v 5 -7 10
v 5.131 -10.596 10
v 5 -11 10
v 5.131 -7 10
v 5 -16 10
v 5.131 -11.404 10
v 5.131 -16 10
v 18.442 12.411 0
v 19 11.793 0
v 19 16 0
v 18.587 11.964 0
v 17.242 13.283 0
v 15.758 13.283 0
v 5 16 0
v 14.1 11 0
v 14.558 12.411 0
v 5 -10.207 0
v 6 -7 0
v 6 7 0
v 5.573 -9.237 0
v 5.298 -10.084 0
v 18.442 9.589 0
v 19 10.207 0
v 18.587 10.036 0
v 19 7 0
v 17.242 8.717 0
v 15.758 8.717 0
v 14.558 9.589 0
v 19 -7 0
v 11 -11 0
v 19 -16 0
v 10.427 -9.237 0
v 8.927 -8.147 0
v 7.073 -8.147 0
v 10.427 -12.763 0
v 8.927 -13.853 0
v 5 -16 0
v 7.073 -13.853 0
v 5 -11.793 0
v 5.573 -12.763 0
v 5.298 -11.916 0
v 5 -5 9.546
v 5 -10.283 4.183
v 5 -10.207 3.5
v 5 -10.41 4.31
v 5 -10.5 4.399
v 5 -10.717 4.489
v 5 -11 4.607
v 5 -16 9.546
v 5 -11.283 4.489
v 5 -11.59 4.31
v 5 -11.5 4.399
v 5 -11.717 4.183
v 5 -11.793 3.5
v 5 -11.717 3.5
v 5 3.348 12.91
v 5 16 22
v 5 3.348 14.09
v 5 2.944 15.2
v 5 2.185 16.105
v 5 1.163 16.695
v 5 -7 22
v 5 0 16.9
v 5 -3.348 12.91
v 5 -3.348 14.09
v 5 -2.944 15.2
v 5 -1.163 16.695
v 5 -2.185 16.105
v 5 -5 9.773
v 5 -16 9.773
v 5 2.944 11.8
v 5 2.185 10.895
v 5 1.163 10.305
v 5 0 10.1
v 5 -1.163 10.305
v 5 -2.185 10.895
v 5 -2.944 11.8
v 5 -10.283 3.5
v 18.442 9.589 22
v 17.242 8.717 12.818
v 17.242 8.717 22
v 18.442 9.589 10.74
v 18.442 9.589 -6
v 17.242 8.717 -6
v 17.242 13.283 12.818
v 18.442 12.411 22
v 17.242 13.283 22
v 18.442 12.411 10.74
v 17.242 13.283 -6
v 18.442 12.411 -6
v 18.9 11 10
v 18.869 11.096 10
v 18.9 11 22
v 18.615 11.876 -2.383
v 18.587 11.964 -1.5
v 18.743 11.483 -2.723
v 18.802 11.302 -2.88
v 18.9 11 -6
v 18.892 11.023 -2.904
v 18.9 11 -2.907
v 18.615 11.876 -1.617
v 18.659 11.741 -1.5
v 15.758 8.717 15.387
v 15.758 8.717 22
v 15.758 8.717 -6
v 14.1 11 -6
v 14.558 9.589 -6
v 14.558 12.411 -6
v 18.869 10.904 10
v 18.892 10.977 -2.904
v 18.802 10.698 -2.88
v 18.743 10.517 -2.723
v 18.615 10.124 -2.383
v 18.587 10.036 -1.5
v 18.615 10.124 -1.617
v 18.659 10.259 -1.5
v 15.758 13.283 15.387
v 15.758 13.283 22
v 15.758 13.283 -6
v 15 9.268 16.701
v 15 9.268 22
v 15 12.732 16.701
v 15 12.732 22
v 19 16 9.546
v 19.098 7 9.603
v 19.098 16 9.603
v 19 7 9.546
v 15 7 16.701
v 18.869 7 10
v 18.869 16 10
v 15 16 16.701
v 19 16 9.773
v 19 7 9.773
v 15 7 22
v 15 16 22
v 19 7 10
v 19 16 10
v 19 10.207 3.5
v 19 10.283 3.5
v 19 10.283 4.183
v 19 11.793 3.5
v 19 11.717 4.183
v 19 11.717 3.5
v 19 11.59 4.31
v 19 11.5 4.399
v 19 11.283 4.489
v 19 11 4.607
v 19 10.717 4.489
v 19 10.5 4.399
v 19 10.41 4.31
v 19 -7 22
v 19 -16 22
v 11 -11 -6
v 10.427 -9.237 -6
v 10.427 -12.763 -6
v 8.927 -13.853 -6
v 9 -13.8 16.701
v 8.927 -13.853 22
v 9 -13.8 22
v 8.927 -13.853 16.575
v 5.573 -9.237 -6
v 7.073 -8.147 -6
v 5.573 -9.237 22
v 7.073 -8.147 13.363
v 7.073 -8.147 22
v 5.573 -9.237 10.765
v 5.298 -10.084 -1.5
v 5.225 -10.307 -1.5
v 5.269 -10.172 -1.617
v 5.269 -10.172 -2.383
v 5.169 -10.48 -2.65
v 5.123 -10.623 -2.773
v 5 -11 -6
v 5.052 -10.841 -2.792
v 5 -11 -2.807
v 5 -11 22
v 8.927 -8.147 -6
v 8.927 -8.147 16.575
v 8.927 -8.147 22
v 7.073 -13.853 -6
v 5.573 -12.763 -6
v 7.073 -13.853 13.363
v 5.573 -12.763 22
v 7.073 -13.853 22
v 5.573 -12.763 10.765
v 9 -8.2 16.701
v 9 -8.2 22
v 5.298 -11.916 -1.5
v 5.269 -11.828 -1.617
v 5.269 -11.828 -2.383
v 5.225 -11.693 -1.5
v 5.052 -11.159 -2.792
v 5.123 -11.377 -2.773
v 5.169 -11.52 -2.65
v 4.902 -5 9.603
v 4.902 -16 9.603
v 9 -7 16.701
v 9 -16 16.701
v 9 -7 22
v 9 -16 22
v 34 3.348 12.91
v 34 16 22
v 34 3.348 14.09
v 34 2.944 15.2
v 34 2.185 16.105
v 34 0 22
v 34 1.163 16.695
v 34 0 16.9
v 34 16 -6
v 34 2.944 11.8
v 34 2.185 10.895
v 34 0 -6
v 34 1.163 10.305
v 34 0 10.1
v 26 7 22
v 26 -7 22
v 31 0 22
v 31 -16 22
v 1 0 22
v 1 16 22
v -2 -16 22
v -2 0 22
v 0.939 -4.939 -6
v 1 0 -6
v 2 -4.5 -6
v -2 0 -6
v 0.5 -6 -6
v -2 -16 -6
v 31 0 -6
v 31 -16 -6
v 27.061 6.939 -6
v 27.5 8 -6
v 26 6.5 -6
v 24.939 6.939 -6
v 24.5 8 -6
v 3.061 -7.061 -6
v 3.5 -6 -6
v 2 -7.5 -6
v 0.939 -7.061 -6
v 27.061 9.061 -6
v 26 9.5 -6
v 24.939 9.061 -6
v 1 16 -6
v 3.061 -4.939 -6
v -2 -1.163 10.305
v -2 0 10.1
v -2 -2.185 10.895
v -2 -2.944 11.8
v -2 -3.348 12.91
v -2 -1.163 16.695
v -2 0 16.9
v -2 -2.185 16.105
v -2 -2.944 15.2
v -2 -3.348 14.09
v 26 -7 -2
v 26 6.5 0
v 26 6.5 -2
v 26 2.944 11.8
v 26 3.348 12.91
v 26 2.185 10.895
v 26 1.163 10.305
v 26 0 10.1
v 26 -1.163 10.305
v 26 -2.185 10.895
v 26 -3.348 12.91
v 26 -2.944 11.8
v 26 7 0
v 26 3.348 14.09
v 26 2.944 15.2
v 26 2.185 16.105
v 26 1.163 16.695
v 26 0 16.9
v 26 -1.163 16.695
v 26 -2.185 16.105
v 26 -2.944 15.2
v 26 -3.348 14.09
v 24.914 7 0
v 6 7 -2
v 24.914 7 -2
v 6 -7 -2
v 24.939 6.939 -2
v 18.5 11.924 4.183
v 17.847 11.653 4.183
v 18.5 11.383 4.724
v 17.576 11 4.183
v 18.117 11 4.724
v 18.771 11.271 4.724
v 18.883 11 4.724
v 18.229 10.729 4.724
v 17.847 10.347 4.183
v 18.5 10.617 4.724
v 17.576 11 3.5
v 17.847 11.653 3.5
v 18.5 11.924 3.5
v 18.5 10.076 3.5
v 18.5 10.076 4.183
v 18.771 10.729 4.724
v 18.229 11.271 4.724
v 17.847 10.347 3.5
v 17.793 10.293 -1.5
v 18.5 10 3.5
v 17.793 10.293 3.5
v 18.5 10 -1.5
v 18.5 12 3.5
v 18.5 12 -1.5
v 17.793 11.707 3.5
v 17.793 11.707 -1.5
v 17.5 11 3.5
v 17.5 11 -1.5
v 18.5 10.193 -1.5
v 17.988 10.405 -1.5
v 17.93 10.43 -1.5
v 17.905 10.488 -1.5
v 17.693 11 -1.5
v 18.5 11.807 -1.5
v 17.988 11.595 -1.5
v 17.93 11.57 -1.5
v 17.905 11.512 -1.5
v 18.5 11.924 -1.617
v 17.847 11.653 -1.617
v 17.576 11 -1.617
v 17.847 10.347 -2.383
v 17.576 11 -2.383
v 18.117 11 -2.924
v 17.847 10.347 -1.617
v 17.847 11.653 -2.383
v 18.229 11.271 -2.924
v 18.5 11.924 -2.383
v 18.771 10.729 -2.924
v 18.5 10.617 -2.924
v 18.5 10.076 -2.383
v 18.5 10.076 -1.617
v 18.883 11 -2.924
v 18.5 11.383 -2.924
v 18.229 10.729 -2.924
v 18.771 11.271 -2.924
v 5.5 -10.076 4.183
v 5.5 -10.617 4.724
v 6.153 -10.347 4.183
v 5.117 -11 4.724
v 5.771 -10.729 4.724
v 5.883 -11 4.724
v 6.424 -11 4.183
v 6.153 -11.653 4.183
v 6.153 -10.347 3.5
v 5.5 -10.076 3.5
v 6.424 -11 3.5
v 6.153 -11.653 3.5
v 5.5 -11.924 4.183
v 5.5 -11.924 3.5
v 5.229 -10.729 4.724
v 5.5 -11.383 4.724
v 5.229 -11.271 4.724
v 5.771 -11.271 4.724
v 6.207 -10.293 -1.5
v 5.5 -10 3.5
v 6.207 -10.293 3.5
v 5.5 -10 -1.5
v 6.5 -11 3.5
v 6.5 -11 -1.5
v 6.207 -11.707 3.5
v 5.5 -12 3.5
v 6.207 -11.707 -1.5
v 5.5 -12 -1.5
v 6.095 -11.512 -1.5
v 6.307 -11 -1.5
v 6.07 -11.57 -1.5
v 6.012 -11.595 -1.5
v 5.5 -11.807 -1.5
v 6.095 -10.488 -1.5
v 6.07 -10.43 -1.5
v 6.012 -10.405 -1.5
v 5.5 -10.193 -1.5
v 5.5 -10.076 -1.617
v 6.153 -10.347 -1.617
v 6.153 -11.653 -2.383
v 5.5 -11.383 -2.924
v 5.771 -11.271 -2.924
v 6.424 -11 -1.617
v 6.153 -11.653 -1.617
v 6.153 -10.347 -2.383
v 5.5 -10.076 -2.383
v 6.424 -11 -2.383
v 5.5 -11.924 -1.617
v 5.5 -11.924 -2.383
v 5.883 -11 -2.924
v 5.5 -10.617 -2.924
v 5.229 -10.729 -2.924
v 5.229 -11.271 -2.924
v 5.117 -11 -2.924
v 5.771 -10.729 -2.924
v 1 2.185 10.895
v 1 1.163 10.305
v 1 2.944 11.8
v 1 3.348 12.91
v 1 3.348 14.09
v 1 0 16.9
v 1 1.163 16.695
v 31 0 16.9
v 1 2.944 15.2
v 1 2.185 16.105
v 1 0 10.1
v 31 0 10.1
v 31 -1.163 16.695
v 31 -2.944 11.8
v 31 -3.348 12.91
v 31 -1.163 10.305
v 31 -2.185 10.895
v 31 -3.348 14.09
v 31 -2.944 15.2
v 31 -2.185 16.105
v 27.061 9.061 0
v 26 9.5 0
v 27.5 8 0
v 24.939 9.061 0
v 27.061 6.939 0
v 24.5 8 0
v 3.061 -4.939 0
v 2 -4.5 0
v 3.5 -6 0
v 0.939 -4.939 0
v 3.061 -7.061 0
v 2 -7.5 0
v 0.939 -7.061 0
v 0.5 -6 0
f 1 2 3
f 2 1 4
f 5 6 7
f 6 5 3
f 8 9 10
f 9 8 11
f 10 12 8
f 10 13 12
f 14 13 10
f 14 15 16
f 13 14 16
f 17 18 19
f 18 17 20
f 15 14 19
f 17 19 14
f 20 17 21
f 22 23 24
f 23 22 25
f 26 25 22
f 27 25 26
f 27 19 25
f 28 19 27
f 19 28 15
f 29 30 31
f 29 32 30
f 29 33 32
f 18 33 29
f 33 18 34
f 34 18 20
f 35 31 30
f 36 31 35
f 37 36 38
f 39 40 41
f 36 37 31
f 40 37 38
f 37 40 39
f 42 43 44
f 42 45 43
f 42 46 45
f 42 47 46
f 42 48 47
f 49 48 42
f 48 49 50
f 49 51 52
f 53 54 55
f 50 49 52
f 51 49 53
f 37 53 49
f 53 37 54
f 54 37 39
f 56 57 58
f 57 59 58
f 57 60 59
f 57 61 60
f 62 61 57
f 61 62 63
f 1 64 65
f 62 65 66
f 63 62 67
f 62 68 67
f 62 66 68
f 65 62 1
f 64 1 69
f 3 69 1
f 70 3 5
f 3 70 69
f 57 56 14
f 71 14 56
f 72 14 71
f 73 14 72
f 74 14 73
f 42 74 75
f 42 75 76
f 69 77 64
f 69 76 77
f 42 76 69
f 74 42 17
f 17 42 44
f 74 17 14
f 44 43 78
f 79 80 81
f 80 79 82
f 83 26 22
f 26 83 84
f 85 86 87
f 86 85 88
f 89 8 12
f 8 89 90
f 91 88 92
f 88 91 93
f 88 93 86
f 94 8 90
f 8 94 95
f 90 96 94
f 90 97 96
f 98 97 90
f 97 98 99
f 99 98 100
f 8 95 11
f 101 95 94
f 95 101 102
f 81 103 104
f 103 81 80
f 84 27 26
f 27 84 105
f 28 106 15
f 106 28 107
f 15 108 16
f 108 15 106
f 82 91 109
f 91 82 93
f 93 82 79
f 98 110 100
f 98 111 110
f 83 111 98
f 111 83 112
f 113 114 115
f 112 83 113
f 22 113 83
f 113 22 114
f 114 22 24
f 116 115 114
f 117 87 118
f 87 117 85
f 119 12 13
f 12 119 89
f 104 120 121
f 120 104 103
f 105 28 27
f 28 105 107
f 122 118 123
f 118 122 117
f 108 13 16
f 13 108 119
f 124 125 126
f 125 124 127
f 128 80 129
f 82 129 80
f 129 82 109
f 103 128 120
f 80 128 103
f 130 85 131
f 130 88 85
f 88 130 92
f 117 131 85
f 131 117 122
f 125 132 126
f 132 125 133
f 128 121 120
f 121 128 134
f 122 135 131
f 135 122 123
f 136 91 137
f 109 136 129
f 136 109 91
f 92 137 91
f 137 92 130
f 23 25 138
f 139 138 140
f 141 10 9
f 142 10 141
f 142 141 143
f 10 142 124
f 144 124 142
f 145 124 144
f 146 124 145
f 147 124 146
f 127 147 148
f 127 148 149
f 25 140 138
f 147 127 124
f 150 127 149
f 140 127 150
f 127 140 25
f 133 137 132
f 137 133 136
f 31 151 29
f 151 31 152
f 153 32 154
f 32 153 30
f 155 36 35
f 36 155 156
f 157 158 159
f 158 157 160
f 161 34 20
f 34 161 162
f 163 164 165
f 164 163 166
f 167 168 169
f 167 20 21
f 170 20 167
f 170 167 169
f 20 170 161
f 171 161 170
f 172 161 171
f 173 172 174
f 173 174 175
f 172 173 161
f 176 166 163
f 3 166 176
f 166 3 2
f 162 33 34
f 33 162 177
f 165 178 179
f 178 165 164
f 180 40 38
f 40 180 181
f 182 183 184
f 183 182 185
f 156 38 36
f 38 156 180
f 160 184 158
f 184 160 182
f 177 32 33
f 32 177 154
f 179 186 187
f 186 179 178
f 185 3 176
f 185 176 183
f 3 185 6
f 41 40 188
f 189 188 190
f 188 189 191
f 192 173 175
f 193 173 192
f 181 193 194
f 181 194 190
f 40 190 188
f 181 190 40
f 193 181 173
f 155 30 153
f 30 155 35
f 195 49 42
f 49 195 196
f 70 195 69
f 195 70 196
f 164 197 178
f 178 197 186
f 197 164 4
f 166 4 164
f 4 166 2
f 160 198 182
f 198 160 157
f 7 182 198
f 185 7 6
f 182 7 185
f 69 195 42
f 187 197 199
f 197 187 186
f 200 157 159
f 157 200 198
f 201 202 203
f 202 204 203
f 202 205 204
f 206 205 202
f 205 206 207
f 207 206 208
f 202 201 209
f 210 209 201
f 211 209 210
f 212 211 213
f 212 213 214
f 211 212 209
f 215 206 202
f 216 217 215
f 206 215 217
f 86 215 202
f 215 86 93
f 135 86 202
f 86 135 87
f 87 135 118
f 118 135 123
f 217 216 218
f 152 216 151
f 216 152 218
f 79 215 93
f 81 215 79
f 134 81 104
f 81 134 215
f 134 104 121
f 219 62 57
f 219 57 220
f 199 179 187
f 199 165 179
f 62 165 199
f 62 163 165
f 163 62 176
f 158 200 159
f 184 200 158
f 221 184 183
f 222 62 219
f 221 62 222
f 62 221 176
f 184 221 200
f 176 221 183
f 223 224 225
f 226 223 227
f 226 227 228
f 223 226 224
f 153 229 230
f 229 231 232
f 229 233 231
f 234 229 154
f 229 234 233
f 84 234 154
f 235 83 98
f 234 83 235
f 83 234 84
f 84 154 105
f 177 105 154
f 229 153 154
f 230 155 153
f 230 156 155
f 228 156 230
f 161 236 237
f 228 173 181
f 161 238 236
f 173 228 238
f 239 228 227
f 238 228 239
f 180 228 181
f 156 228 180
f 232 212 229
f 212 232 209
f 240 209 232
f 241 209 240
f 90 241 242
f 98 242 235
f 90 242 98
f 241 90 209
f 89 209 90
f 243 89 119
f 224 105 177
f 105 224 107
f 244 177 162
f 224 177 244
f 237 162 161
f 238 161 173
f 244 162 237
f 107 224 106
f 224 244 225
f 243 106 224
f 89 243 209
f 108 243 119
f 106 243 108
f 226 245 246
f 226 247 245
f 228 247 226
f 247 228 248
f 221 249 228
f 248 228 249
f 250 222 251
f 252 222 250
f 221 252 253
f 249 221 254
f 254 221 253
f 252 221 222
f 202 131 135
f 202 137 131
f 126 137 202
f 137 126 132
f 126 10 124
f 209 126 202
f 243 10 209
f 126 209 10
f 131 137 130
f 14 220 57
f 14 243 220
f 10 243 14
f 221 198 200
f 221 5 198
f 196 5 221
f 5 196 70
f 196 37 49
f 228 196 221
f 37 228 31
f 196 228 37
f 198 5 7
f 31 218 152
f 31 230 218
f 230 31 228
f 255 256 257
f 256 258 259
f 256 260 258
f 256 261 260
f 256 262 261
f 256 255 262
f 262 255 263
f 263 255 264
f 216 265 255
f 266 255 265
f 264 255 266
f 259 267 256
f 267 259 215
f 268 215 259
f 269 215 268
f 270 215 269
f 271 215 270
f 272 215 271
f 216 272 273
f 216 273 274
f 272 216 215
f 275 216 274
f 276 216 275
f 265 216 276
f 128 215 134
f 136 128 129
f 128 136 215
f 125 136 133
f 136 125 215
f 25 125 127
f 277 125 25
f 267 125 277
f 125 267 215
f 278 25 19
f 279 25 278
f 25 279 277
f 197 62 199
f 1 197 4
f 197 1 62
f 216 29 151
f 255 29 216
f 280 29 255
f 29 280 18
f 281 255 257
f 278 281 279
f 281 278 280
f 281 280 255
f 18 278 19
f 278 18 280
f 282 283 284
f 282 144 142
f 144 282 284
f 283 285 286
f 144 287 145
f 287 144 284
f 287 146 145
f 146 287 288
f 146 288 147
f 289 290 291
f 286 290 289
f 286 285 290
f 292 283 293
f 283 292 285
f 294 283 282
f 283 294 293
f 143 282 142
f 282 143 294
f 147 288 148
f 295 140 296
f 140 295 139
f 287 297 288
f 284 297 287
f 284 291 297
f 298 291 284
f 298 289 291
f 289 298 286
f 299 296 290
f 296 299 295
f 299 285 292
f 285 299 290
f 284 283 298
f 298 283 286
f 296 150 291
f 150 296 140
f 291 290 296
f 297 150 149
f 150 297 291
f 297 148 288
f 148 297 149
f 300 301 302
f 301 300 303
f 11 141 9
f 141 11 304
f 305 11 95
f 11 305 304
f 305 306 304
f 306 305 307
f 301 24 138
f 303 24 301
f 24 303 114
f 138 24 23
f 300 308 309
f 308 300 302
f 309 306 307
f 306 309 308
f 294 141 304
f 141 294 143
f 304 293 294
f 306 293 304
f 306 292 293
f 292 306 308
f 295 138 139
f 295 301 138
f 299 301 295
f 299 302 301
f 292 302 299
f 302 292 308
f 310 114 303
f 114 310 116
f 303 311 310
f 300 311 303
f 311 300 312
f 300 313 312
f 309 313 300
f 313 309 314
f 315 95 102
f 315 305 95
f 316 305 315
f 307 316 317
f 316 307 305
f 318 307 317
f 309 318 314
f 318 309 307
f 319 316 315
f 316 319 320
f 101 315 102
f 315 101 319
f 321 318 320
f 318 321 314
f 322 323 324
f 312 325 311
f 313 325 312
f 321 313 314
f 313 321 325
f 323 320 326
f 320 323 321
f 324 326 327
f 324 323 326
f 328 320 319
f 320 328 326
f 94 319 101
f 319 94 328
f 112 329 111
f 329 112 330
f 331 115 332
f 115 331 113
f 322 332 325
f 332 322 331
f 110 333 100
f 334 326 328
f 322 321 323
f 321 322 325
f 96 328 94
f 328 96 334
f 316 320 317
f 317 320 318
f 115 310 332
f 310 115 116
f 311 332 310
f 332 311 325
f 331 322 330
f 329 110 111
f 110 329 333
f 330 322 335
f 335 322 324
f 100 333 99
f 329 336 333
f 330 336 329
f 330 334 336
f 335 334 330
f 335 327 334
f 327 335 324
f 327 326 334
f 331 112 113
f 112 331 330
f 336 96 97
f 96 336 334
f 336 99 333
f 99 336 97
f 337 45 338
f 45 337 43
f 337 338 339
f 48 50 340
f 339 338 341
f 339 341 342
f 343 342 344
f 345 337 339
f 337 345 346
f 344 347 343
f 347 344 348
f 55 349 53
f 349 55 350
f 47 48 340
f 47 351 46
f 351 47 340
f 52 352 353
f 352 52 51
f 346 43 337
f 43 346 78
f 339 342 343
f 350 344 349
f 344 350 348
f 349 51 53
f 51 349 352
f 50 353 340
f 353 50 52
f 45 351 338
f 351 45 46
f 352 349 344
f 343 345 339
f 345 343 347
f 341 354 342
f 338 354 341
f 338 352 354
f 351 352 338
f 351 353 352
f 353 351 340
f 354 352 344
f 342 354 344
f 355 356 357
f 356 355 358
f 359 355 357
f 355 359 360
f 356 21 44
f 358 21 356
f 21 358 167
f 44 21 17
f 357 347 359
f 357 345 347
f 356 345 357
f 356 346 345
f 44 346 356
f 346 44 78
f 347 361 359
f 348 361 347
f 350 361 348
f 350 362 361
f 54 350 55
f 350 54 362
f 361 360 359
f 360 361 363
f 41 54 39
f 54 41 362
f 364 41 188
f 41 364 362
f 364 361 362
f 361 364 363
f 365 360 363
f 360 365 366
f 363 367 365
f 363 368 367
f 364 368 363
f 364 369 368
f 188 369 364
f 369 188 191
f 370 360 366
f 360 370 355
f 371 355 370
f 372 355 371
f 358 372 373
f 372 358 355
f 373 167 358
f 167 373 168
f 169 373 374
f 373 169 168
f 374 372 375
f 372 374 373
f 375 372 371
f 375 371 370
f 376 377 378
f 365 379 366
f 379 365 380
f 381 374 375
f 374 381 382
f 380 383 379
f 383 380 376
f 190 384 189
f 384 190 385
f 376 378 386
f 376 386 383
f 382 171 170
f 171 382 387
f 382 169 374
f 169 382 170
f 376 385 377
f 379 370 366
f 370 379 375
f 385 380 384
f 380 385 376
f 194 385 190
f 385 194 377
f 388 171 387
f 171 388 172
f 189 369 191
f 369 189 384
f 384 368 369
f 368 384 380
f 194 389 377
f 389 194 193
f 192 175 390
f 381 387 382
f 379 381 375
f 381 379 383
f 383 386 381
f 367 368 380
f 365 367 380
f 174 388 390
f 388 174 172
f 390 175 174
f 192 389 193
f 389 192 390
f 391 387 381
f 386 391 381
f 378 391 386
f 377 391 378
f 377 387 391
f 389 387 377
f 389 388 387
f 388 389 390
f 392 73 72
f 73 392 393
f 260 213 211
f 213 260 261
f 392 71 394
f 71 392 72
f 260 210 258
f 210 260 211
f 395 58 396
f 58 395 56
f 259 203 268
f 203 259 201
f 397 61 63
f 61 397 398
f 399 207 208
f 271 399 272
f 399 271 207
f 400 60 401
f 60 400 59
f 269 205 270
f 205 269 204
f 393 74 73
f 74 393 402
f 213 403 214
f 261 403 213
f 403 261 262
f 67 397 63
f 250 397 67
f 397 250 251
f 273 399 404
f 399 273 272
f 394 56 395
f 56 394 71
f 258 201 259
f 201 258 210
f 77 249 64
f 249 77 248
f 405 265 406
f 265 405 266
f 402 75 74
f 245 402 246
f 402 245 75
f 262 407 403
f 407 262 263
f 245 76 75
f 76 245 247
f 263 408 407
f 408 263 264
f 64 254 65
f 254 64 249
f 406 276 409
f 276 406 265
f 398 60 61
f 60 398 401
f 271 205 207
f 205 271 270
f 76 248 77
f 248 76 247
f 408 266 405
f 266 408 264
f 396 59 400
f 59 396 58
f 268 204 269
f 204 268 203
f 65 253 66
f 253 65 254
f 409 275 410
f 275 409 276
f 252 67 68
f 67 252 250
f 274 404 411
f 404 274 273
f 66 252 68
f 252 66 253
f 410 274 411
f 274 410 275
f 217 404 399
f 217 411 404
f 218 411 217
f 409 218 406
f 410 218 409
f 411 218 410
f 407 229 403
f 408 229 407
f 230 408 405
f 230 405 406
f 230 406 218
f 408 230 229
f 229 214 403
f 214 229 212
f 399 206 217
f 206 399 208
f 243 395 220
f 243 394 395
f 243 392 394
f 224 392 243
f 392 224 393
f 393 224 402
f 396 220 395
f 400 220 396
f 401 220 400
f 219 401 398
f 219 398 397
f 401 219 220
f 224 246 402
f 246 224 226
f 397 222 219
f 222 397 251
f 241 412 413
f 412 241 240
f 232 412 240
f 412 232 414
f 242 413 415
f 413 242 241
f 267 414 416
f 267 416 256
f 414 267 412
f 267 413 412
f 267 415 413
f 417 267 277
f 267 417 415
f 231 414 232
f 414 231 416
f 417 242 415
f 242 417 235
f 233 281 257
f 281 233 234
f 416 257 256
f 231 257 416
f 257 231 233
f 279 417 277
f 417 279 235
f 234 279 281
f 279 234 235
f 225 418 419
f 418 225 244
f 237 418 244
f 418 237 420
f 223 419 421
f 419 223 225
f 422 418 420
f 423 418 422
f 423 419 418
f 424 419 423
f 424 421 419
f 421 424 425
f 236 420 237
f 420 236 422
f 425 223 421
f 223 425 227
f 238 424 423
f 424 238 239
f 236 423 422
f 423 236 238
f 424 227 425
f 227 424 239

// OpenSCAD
module blockr(len, wid, ht, slot, n) {
   tuber = 3;
   stuber = 2.4;
   yoff = 11;


	difference() { 
      translate([len/3+4,0,8])
         cube([len,wid,ht+8],center=true);
   translate([15.5,0,18]) cube([21,14,16], center=true);
      translate([3*slot/2+4,0,7])
         cube([20,14,18],center=true);
  
		ssection(slot,wid,ht,stuber,n,yoff);
      translate([3*slot,0,0])
        mirror([1,0,0])
		    section(slot,wid,ht,tuber,n,-yoff);

   }
   translate([0,4,0])

translate([0,0,2])
   pip(slot,wid,ht,3,n, 0.5+slot/2, yoff-4);
translate([0,0,2])
   pip(slot,wid,ht,3,n, -(slot/2+3*tuber/2), -yoff);
			
}

module section(slot,wid,ht,tuber, n,yoff) {
		translate([2*n*slot-(7*slot)/8,yoff,5])
			cube([slot,4*wid,ht/2], center=true);
   	translate([2*n*slot,yoff,ht/3])
         cylinder(r=tuber,h=3*ht,center=true,$fn=10);
      translate([2*n*slot-1.75,yoff,ht/2+2])
         rotate([0,60,0])
           cube([9,12,6], center=true);
      translate([2*n*slot-6,yoff,ht/2+8])
           cube([10,12,16], center=true);
}
module ssection(slot,wid,ht,tuber, n,yoff) {
		translate([2*n*slot-(7*slot)/8,yoff,5])
			cube([slot,4*wid,ht/2], center=true);
   	translate([2*n*slot+0.5,yoff,ht/3])
         cylinder(r=tuber,h=3*ht,center=true,$fn=10);
      translate([2*n*slot-1.75,yoff,ht/2+2])
         rotate([0,60,0])
           cube([9,12,6], center=true);
      translate([2*n*slot-6,yoff,ht/2+8])
           cube([10,12,16], center=true);
}


module pip(slot,wid,ht,tuber,n, xoff, yoff) {
       translate([xoff+2*n*slot-tuber/2-0.5,yoff,1.8])
         sphere(tuber/3,center=true,$fn=8);

   	translate([xoff+2*n*slot-tuber/2-0.5,yoff,-1])
         cylinder(r=tuber/3,h=1+ht/5,center=true,$fn=8);


       translate([xoff+2*n*slot-tuber/2-0.5,yoff,-4])
         sphere(tuber/3,center=true,$fn=8);
}
difference() {
   blockr(36,32,20,8,1 );
   translate([20,0,10+3.5])
        rotate([0,90,0]) cylinder(r=3.4,h=70,center=true,$fn=18);
   translate([35,-17,0]) cube([8,34,48], center=true);
   translate([-3,17,0])  cube([8,34,48], center=true);
   translate([26,8,-4]) cylinder(r=1.5,h=8,center=true,$fn=8);
   translate([2, -6,-4]) cylinder(r=1.5,h=8,center=true,$fn=8);
}
